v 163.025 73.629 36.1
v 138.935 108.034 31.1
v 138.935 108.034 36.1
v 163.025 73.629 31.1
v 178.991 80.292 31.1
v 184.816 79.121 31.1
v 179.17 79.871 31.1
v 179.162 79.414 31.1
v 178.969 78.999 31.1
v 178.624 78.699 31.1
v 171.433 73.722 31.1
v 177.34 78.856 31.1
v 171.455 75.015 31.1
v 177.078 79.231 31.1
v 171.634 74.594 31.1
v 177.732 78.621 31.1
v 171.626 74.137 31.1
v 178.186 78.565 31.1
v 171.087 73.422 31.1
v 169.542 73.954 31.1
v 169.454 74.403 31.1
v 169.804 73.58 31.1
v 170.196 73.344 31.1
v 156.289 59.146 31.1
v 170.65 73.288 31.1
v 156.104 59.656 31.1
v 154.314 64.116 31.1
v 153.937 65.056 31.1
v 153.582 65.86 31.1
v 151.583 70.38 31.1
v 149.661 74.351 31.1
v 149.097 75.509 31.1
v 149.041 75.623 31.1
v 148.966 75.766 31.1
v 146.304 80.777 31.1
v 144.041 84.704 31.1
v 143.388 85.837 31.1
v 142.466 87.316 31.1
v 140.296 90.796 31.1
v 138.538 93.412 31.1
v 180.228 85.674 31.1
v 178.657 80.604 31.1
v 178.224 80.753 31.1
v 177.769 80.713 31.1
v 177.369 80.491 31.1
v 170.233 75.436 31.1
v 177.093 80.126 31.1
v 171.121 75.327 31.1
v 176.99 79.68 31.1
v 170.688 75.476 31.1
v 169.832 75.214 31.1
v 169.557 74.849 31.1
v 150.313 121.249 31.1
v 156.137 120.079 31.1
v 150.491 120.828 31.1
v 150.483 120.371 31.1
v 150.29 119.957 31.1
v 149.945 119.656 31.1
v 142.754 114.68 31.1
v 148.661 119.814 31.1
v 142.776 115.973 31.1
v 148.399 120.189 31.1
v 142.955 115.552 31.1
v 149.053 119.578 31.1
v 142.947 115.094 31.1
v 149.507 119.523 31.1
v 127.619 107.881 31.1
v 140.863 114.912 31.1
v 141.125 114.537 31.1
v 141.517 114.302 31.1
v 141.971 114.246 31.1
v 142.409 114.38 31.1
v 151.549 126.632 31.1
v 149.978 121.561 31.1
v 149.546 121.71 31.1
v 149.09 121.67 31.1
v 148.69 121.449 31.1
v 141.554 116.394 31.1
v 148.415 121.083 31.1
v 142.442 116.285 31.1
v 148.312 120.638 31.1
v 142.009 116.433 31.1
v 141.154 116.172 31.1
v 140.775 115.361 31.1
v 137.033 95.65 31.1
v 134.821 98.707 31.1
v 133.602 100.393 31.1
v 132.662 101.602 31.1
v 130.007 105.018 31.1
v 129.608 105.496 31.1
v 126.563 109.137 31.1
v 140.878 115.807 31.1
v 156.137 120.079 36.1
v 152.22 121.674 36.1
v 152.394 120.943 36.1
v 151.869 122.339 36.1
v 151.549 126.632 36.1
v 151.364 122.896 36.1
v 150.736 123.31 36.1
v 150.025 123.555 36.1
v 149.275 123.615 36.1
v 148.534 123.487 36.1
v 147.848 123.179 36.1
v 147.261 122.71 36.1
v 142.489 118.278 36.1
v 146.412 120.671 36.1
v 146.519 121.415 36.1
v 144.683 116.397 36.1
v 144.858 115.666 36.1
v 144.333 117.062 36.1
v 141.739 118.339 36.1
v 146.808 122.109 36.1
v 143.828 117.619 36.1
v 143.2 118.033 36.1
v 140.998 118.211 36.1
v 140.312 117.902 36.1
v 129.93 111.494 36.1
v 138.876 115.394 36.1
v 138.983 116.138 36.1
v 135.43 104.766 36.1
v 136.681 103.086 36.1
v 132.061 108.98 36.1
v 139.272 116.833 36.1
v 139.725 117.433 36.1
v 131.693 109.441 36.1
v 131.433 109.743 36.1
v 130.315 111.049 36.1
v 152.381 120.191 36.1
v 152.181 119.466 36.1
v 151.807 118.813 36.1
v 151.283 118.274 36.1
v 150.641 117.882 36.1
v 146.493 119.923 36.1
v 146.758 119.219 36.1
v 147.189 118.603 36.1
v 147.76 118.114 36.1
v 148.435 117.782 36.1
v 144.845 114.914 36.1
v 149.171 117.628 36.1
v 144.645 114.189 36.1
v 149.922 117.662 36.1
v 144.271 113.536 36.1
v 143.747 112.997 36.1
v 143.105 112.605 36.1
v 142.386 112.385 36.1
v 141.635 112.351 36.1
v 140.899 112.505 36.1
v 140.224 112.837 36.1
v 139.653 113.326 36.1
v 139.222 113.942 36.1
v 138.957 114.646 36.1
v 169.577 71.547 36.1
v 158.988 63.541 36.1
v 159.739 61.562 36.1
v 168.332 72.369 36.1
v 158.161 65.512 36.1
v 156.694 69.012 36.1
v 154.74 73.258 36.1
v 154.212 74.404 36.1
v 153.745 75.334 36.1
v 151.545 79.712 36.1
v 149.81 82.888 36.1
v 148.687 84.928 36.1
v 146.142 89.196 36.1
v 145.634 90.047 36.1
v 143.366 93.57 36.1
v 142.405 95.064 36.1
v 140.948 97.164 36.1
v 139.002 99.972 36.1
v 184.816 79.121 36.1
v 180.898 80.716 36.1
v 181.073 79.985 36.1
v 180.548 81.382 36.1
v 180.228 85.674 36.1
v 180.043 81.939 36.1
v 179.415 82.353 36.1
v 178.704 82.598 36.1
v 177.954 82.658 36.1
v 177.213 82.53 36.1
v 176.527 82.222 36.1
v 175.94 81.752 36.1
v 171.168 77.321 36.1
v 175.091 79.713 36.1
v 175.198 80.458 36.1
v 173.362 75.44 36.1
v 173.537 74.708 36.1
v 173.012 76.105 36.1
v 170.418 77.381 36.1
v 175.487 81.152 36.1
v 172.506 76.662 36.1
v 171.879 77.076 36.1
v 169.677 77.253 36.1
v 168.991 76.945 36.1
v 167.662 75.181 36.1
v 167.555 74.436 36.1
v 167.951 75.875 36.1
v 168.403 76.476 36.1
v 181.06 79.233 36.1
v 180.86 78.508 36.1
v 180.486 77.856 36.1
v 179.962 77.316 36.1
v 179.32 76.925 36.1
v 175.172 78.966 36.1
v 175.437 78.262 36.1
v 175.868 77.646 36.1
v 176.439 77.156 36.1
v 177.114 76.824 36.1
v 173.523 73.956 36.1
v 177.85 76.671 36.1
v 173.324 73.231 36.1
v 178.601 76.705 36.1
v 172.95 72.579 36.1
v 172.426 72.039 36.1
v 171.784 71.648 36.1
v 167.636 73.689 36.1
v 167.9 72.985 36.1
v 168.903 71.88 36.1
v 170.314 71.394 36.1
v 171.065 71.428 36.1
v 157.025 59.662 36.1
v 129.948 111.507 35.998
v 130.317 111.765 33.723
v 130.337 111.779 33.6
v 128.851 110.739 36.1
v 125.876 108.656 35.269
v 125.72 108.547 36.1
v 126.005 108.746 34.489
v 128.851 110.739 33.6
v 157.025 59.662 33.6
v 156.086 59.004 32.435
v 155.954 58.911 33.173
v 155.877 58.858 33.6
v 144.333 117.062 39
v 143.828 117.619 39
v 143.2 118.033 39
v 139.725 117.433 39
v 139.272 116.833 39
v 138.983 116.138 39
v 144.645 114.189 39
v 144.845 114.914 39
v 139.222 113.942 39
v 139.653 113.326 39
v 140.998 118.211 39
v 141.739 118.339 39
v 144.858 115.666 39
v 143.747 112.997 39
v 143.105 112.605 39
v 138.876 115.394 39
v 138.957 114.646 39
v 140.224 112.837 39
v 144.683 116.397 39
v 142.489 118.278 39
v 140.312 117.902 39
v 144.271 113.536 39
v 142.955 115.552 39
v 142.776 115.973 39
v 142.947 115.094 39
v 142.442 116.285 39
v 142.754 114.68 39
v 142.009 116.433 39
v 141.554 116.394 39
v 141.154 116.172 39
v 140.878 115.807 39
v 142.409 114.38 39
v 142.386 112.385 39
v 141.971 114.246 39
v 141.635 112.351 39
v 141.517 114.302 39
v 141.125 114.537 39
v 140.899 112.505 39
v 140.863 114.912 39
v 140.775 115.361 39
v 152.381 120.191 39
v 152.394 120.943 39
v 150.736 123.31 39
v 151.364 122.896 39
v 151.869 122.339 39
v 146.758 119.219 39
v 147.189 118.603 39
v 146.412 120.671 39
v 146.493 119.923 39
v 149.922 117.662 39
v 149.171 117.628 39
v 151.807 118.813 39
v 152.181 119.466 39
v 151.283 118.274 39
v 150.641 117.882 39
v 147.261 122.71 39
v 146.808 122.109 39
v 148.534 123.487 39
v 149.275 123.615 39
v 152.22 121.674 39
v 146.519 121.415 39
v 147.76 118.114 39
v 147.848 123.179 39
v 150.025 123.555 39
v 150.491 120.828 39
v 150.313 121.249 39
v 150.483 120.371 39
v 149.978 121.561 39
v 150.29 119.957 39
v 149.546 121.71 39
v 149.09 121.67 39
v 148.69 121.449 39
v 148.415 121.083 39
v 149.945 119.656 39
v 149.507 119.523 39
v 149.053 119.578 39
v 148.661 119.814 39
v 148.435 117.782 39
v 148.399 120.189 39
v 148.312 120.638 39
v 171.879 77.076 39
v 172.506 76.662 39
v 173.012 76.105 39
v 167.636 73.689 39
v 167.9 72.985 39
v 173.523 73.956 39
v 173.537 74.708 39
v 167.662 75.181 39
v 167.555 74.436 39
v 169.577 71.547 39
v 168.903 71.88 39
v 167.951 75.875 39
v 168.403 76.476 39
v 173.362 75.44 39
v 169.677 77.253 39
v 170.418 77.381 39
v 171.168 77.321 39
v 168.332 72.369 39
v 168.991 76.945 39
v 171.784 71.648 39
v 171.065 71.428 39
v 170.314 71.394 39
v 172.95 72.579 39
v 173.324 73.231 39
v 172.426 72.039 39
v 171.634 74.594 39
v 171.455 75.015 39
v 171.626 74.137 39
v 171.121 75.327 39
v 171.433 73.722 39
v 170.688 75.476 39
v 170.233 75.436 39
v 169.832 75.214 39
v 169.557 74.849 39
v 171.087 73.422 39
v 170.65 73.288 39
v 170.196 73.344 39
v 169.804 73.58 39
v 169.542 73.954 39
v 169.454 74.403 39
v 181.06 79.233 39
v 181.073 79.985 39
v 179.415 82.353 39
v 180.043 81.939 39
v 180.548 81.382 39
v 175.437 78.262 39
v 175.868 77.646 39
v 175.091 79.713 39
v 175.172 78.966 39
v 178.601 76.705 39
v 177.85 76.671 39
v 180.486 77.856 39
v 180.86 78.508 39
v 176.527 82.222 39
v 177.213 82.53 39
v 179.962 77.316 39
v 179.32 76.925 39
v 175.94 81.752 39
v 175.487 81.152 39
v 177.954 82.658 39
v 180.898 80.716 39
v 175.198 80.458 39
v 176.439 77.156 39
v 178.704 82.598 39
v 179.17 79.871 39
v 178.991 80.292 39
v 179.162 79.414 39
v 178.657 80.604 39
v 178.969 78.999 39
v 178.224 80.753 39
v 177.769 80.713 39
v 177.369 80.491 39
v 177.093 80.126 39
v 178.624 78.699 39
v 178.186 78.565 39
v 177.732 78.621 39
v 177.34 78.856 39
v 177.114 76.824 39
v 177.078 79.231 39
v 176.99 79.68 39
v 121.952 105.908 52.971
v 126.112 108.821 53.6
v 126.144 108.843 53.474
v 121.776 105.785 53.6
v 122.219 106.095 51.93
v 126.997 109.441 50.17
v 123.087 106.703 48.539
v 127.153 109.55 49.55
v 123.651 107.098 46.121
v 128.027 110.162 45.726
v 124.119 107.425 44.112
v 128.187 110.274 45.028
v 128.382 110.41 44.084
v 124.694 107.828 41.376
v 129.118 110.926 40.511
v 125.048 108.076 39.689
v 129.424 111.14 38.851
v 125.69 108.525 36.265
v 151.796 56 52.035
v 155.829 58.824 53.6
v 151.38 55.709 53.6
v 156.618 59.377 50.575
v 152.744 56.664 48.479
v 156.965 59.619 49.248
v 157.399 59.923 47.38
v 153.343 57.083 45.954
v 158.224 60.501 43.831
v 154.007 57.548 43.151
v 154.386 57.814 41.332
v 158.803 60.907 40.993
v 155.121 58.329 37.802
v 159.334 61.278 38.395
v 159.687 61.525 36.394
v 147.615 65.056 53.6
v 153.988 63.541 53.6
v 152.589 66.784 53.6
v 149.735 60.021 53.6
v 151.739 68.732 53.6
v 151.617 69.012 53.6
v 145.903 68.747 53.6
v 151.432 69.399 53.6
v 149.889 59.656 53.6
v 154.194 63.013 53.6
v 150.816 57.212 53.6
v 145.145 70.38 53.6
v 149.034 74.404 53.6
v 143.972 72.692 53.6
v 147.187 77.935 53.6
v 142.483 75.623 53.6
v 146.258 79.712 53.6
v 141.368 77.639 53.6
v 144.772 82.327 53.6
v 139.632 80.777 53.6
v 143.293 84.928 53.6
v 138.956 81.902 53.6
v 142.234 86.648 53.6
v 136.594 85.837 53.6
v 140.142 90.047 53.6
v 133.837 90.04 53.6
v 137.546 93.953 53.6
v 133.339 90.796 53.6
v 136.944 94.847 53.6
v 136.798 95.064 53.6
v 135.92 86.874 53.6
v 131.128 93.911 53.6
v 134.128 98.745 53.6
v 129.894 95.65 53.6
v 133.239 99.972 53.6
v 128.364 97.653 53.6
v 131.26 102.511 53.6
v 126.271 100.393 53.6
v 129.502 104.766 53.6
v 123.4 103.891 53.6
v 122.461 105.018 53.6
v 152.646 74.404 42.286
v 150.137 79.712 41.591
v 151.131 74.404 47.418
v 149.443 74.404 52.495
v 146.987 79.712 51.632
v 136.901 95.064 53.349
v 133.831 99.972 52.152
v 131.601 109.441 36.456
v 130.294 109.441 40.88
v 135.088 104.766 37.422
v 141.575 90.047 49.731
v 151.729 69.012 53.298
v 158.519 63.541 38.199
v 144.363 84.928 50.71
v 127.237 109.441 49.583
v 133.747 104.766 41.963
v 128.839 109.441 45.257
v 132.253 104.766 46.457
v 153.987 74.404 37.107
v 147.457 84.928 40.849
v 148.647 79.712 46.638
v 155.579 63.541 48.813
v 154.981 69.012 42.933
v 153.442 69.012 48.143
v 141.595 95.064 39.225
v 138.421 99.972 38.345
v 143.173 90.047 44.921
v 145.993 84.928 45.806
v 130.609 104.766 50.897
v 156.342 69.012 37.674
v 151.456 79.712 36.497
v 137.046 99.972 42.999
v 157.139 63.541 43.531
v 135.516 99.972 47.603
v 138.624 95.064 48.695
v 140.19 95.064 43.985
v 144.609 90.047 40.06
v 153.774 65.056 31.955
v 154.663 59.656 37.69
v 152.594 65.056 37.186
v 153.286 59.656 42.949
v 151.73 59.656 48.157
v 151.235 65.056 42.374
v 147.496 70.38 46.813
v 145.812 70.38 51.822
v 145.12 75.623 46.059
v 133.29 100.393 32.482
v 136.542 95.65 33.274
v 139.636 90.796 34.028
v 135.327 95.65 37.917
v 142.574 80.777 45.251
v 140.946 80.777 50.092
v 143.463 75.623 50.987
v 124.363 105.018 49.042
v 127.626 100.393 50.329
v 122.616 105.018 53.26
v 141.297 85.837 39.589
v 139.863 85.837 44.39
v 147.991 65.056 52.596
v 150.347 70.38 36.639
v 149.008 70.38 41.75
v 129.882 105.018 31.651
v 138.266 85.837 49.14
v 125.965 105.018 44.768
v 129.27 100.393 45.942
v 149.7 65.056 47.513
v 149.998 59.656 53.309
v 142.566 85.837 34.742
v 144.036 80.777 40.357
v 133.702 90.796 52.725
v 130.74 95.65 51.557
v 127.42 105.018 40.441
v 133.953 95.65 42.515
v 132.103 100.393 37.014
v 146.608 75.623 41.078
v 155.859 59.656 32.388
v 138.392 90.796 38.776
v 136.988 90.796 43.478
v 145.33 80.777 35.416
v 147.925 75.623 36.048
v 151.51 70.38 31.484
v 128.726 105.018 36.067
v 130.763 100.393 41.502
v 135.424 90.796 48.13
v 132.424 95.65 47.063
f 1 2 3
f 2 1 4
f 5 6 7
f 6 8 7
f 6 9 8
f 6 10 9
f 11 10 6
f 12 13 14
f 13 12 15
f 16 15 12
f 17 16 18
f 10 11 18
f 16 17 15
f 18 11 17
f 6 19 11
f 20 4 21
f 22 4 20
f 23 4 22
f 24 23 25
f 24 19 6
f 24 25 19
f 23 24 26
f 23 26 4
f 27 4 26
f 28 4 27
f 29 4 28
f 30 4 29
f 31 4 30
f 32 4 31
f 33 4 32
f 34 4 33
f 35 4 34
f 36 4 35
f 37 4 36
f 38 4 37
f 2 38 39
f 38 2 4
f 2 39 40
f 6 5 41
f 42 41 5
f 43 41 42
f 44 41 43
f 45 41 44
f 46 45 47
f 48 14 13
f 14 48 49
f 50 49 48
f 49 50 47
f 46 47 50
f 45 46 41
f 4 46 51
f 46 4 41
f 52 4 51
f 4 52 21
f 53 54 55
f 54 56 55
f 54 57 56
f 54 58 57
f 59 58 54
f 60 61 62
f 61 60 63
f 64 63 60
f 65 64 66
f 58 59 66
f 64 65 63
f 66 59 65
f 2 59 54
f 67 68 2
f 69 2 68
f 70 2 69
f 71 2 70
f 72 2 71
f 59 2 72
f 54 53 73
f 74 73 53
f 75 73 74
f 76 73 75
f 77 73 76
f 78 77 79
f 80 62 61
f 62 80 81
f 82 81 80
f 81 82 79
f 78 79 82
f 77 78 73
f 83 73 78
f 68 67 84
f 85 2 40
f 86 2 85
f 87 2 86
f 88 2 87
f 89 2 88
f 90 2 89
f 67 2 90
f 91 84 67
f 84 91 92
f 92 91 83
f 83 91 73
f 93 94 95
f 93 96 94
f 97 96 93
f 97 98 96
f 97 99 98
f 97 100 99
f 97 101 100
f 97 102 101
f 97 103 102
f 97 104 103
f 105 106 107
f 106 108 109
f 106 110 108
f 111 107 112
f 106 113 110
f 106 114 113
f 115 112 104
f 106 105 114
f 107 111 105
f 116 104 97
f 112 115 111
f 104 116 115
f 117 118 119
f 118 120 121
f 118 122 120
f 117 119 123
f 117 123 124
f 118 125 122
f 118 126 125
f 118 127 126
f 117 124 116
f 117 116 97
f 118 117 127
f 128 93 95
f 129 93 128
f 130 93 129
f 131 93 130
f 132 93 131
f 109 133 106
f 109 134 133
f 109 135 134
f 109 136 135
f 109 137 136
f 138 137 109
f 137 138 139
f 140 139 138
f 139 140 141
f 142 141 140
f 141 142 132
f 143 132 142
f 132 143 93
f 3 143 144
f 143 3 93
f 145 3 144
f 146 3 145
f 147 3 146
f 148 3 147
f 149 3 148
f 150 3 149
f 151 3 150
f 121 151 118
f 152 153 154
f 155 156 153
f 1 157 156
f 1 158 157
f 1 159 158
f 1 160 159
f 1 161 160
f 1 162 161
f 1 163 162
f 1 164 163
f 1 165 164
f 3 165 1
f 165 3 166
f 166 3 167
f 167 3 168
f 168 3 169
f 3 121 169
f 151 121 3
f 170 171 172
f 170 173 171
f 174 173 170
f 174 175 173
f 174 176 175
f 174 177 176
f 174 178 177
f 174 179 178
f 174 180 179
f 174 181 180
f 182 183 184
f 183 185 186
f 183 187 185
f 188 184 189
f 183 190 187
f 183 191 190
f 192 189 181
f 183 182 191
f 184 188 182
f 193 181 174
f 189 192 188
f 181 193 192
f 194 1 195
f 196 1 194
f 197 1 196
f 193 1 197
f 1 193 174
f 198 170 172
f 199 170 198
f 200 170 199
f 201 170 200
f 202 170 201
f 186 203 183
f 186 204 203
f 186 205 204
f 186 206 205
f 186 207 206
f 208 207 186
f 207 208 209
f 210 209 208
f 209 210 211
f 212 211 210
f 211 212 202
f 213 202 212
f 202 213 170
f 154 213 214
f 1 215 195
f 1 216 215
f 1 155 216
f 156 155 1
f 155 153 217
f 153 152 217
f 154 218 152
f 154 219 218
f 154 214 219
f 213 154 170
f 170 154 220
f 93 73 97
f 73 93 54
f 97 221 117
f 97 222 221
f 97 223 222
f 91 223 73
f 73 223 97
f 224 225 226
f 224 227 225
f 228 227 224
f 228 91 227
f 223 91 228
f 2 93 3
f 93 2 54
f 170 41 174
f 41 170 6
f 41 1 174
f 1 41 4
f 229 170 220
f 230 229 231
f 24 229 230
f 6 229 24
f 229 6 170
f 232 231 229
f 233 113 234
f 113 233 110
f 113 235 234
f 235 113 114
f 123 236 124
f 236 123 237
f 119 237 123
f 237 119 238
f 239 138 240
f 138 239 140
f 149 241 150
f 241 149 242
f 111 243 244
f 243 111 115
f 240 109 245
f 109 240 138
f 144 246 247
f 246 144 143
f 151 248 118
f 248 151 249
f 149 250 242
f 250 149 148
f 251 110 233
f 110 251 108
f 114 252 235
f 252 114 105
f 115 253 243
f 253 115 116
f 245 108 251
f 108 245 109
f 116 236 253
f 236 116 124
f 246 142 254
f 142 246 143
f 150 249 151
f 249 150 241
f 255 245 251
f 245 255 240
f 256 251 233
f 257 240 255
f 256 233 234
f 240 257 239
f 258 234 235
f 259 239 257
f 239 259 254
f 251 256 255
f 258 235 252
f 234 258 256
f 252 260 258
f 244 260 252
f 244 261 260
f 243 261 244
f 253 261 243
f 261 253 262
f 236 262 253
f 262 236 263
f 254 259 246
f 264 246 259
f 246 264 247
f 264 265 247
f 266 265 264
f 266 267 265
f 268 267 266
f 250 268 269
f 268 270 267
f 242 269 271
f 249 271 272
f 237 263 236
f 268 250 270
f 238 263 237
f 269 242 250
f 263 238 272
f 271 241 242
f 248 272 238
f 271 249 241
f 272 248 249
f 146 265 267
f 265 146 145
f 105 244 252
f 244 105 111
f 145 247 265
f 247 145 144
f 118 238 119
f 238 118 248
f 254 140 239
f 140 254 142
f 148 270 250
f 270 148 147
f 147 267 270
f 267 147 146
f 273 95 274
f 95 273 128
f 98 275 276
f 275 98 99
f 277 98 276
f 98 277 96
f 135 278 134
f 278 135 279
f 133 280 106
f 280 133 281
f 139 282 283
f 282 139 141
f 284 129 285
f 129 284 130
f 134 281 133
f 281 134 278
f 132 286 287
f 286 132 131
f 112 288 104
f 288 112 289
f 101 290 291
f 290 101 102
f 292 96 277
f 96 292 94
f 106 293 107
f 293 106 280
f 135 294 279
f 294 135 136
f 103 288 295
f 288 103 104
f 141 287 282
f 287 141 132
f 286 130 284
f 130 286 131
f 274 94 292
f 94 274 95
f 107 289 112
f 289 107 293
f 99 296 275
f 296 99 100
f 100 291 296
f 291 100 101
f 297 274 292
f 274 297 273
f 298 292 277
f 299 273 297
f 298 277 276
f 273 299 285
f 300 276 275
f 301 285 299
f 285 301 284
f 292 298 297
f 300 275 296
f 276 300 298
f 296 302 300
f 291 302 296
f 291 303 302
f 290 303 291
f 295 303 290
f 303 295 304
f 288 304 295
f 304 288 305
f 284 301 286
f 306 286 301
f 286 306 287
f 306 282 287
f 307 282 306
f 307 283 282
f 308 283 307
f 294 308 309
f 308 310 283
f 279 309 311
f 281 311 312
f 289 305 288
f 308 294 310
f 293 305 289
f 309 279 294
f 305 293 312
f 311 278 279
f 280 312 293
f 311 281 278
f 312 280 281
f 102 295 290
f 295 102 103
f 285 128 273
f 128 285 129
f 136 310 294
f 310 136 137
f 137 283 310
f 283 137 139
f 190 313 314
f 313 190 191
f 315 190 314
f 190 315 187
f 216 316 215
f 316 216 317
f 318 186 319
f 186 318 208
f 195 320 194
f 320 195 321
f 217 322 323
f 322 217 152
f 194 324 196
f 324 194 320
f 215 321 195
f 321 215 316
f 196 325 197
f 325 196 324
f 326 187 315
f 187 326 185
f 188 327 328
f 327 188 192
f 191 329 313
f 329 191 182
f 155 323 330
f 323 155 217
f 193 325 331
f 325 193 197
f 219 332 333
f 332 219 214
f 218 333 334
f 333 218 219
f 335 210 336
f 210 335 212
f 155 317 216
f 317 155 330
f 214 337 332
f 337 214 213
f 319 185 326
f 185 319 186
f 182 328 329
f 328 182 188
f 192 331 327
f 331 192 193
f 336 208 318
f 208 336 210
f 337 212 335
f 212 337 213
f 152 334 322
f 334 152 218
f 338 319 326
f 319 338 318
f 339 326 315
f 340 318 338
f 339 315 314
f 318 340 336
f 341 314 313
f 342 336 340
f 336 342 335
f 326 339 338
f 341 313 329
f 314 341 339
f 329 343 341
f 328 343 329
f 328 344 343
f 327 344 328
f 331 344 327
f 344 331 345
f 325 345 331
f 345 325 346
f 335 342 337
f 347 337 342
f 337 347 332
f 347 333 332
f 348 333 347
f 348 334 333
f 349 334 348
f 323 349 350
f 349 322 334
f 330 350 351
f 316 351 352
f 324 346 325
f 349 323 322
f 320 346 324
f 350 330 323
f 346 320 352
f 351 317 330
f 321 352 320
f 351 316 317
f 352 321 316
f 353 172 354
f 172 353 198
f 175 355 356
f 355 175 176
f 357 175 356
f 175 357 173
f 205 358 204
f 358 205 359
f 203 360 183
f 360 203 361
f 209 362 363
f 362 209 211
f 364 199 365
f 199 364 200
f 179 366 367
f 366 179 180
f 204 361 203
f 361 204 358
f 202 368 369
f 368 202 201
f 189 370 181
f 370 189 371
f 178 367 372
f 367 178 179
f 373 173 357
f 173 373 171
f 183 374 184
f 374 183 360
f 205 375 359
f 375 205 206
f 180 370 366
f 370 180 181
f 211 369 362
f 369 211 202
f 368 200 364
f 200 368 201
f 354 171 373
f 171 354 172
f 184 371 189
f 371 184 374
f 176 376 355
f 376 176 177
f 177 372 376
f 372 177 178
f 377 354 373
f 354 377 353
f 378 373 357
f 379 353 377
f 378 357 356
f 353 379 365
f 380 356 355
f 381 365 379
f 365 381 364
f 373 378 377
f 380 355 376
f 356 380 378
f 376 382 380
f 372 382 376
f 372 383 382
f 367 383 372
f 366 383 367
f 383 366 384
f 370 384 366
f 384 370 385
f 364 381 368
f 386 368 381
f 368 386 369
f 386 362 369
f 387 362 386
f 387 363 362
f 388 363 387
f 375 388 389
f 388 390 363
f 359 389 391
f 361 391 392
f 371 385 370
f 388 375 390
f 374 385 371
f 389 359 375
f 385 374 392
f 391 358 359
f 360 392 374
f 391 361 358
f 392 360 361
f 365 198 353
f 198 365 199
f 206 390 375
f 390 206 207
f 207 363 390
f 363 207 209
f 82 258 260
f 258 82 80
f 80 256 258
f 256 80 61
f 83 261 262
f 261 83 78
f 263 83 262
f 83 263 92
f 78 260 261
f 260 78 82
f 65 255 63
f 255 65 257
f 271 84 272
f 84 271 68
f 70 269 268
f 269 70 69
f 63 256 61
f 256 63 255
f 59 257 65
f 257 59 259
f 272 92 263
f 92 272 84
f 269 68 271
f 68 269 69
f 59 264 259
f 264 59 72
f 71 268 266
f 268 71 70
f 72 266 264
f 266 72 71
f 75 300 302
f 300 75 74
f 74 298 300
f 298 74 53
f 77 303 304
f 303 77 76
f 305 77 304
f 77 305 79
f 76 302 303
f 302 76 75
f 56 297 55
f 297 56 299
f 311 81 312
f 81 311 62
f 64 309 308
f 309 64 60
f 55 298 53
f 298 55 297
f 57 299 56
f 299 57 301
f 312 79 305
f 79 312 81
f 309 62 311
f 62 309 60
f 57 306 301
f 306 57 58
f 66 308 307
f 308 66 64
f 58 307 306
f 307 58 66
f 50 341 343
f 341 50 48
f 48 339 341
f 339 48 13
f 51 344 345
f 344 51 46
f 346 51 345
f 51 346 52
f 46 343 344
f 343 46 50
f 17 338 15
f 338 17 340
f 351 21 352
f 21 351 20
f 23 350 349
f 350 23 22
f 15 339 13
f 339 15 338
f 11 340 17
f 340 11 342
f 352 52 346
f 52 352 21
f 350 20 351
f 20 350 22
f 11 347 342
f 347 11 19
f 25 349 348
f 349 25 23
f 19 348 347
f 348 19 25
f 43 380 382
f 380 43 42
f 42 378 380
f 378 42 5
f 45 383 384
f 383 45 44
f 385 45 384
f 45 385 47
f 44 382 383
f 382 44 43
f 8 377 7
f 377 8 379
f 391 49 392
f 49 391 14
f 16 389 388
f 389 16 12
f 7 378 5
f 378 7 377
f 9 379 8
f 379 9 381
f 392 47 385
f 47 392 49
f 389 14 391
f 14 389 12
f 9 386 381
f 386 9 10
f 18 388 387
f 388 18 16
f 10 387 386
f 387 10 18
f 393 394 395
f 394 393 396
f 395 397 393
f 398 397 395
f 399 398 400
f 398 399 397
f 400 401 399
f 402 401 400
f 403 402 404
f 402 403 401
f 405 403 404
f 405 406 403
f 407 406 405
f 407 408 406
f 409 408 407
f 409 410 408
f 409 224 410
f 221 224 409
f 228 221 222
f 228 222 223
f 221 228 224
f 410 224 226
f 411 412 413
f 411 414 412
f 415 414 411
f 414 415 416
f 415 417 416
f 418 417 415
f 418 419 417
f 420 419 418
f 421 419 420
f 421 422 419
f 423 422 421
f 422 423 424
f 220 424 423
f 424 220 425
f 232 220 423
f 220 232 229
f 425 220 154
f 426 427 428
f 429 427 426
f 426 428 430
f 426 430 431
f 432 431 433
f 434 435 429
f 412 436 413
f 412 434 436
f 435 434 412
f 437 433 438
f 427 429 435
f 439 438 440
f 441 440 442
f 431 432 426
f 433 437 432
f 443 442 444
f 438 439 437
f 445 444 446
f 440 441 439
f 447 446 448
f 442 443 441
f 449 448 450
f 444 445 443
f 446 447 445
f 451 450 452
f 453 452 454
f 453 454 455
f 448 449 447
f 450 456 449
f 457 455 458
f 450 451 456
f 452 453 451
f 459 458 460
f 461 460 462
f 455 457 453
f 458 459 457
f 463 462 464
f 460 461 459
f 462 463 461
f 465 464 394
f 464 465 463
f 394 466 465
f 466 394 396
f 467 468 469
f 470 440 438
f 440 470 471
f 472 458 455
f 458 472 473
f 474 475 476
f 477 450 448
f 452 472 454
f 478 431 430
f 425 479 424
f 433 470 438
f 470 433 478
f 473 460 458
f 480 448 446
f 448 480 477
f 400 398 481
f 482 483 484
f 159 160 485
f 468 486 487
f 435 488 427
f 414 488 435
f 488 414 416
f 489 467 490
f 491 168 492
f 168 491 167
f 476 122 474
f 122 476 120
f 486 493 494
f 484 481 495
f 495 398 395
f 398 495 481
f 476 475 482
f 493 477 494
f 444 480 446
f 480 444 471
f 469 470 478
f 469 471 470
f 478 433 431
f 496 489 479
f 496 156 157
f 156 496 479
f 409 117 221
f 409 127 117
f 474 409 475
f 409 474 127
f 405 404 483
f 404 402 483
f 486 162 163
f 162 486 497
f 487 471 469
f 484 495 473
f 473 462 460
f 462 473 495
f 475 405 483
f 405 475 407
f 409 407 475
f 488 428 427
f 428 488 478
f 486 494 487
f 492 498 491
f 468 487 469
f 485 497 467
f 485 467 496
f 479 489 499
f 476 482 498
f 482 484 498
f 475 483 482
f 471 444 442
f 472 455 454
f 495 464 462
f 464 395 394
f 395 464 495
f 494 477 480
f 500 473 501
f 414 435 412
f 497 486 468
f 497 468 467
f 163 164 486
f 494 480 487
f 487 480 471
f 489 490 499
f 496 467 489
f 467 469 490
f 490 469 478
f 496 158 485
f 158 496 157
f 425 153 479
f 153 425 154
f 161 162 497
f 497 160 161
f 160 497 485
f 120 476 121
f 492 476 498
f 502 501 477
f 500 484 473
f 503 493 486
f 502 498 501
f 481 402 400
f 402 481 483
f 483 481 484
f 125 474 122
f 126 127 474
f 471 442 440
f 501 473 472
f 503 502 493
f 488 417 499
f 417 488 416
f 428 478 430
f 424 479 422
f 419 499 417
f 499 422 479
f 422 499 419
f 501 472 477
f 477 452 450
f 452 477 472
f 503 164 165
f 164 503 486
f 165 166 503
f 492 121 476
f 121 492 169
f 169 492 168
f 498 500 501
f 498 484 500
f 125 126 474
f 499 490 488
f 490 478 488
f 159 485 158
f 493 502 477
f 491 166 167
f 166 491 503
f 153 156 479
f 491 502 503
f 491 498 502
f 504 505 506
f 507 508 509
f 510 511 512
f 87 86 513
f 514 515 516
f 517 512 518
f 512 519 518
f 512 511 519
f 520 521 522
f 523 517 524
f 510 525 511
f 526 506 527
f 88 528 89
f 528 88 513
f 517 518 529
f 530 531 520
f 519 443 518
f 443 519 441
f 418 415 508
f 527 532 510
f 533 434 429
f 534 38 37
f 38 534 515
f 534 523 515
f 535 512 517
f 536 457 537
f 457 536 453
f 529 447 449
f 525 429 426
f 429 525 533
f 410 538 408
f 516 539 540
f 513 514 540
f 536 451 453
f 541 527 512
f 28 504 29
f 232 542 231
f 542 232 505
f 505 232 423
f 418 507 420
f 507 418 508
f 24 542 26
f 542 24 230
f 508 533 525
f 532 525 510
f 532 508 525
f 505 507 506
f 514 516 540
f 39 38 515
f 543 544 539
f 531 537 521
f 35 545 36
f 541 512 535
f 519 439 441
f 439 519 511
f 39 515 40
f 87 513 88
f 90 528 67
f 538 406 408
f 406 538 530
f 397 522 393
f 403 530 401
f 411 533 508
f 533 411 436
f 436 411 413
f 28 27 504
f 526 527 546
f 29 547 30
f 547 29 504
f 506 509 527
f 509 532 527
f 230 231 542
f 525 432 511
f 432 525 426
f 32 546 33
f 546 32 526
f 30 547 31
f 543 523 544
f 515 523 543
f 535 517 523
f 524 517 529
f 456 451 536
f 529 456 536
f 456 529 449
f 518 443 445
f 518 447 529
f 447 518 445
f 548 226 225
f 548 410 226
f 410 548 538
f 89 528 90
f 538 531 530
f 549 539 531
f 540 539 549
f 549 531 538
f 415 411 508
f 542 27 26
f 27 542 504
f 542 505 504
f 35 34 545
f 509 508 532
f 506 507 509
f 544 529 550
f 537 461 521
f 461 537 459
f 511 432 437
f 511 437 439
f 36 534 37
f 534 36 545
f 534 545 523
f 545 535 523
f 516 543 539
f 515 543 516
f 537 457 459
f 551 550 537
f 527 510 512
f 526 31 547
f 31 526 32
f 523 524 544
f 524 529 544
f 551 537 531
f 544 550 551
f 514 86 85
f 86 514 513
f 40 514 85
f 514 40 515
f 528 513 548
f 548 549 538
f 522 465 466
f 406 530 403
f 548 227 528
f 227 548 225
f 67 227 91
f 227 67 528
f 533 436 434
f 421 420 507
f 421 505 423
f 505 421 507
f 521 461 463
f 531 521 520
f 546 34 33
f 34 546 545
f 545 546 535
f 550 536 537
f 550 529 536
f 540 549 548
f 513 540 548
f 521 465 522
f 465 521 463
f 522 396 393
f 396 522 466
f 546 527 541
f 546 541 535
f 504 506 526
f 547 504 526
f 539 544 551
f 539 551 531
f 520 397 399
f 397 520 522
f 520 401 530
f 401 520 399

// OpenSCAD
// file: ../motors/MN5212.scad
use <../utils.scad>

module MN5212(){

	//render(){
		difference(){
			union(){
				translate([0,0, 42.5 / 2 - 23 / 2 - 4.9 - 6])
					cylinder(
						h = 23,
						r = 59 / 2,
						$fa = fa(59 / 2),
						center = true);
				translate([0,0, 42.5 / 2 - 4.9 / 2 - 6])
					cylinder(
						h = 4.9,
						r1 = 59 / 2,
						r2 = 24.8 / 2,
						$fa = fa(59 / 2),
						center = true);
				translate([0,0, - 42.5 / 2 + 5.6 / 2 + 3])
					cylinder(
						h = 5.6,
						r1 = 44 / 2,
						r2 = 59 / 2,
						$fa = fa(59 / 2),
						center = true);
				translate([0, 0, 42.5 / 2 - 3])
					cylinder(
						h = 6,
						r = 4 / 2,
						$fa = fa(4 / 2),
						center = true);
				translate([0, 0, - 42.5 / 2 + 1.5])
					cylinder(
						h = 3,
						r = 6 / 2,
						$fa = fa(6 / 2),
						center = true);
			}
			union(){
				for(i = [0:90:270])
					rotate([0, 0, i])
						translate([0, 25 / 2, -16.25 - 0.025])
							cylinder(
								h = 4,
								r = 3 / 2,
								$fa = fa(3 / 2),
								center = true);
				for(i = [0:120:240])
					rotate([0, 0, i])
						translate([0, 17 / 2, 12.75 + 0.025])
							cylinder(
								h = 5,
								r = 3 / 2,
								$fa = fa(3 / 2),
								center = true);
				rotate([0, 0, 30])
					translate([0, 12 / 2, 12.75 + 0.025])
						cylinder(
							h = 5,
							r = 3 / 2,
							$fa = fa(3 / 2),
							center = true);
				rotate([0, 0, 30 + 180])
					translate([0, 12 / 2, 12.75 + 0.025])
						cylinder(
							h = 5,
							r = 3 / 2,
							$fa = fa(3 / 2),
							center = true);
			}
		}

	//}

}

MN5212();
// file: ../servos/TGY_4805_2PA.scad
use <../utils.scad>

module TGY_4805_2PA(){

	length = 40;
	width = 20;
	depth = 36.4;
	wing_width = 58;
	wing_thick = 2.45;
	wing_height = 27.7;
	shaft_offset = 9.5;
	hole_seperation = 9.2;
	hole_spacing = 50;
	shaft_height = 40;
	shaft_length = 3.6;
	hole_diameter = 4.8;

	module mounting_hole(){
		mh_rad = hole_diameter / 2;
		translate(
			[
				hole_spacing / 2,
				0,
				-depth / 2 + wing_height - wing_thick / 2
			])
			cylinder(h = 5, r = mh_rad, $fa = fa(mh_rad), center = true);
	}

	difference(){
		union(){
			cube([length, width, depth], center = true);
			translate([0, 0, -depth / 2 + wing_height - wing_thick / 2])
				cube([wing_width, width, wing_thick], center = true);
			translate(
				[
					- length / 2 + shaft_offset,
					0,
					shaft_height - length / 2 + shaft_length / 2
				])
				cylinder(
					h = shaft_length,
					r = 1.5,
					$fa = fa(1.5),
					center = true);
		}	union(){

			translate([0, hole_seperation / 2, 0]){
				mounting_hole();
				mirror() mounting_hole();
			}
			translate([0, -hole_seperation / 2, 0]){
				mounting_hole();
				mirror() mounting_hole();
			}
		}
	}
}

module TGY_4805_2PA_translate(){
	length = 40;
	shaft_offset = 9.5;
	shaft_height = 40;
	shaft_length = 3.6;
	translate(
		[
				- length / 2 + shaft_offset,
				0,
				shaft_height - length / 2 + shaft_length / 2
		]) children();
}

TGY_4805_2PA();
// file: ../servos/HS_5065MG.scad
use <../utils.scad>

module HS_5065MG(){

	length = 23.75;
	width = 11.68;
	depth = 20.32;
	wing_width = 32.38;
	wing_thick = 2;
	wing_offset = 1;
	shaft_offset = 6;
	hole_spacing = 28.32;
	hole_spacing_2 = 27;
	hole_2_wide = 6;
	hole_diameter = 2;
	shaft_height = 26.16;
	shaft_length = 2;

	module mounting_hole(){
		mh_rad = hole_diameter / 2;
		translate(
			[
				hole_spacing / 2,
				0,
				depth / 2 - wing_thick / 2
			])
			cylinder(h = 5, r = mh_rad, $fa = fa(mh_rad), center = true);
		translate(
			[
				hole_spacing_2 / 2,
				hole_2_wide / 2,
				depth / 2 - wing_thick / 2
			])
			cylinder(h = 5, r = mh_rad, $fa = fa(mh_rad), center = true);
		translate(
			[
				hole_spacing_2 / 2,
				- hole_2_wide / 2,
				depth / 2 - wing_thick / 2
			])
			cylinder(h = 5, r = mh_rad, $fa = fa(mh_rad), center = true);
	}

	difference(){
		union(){
			cube([length, width, depth], center = true);
			translate([0, 0, depth / 2 - wing_thick / 2 - wing_offset])
				cube([wing_width, width, wing_thick], center = true);
			translate(
				[
					- length / 2 + shaft_offset,
					0,
					depth / 2 + 3.8 + 1.9 + shaft_length / 2
				])
				cylinder(
					h = shaft_length,
					r = 1.5,
					$fa = fa(1.5),
					center = true);
			translate(
				[
					- length / 2 + shaft_offset,
					0,
					depth / 2 + 3.8 / 2
				])
				cylinder(
					h = 3.8,
					r = 11.3 / 2,
					$fa = fa(11.3 / 2),
					center = true);
			translate(
				[
					- length / 2 + shaft_offset,
					0,
					depth / 2 + 3.8 + 1.9 / 2
				])
				cylinder(
					h = 1.9,
					r1 = 11.3 / 2,
					r2 = 8 / 2,
					$fa = fa(11.3 / 2),
					center = true);
		}	union(){

			mounting_hole();
			mirror() mounting_hole();
		}
	}
}

module HS_5065MG_arm(){

	hole_size = 1.5;
	hole_spacing = 3;
	hole_offset = 9.6;

	difference(){
		union(){
			translate([0, 0, 4.4 / 2])
				cylinder(
					h = 4.4,
					r = 8 / 2,
					$fa = fa(8 / 2),
					center = true);
			hull(){
				translate([0, 0, 4.4 - 1.8 / 2])
					cylinder(
						h = 1.8,
						r = 8 / 2,
						$fa = fa(8 / 2),
						center = true);
				translate([18.8, 0, 4.4 - 1.8 / 2])
					cylinder(
						h = 1.8,
						r = 5 / 2,
						$fa = fa(5 / 2),
						center = true);
			}
		}
		union(){
			for(i = [0:3]){
				translate([hole_offset + hole_spacing * i, 0, 4.4 - 1.8 / 2])
					cylinder(
						h = 5,
						r = hole_size / 2,
						$fa = fa(hole_size / 2),
						center = true);
			}
		}
	}
}

module HS_5065MG_shaft_translate(){
	translate(
		[
			- 23.75 / 2 + 6,
			0,
			20.32 / 2 + 3.8 + 1.9
		])
			children();
}

HS_5065MG();
HS_5065MG_shaft_translate() HS_5065MG_arm();
// file: ../servos/LS_0006_servo.scad
// Author Michael Marques (DrYerzinia)

use <../utils.scad>

module ls_0006_servo(){
	
	length = 21.4;
	depth = 19.9;
	thickness = 11.65;

	gear_height = 2.6;
	gear_bump_height = 0.7;
	gear_bump_diameter = 1.97;
	gear_outer_bump_diameter = 6;
	gear_bump_offset = 12.2;

	shaft_height = 2.4;
	shaft_diameter = 3.74;
	shaft_offset = thickness / 2;
	shaft_screw_diameter = 1.3;
	
	wing_outer_width = 8.5;
	wing_top_off = 3.8;
	wing_length = 3.8;
	wing_thickness = 1.2;
	wing_hole_diameter = 1.85;
	wing_hole_edge_dist = 2;

	module wing_hole(){
		translate(
			[
				length / 2 + wing_hole_edge_dist,
				0,
				depth/2 - wing_top_off - wing_thickness / 2
			])
			cylinder(
				h = wing_thickness + 1,
				r = wing_hole_diameter / 2,
				$fn = 16,
				center = true);
	}

	module wing(){
		translate(
			[
				length / 2,
				thickness / 2,
				depth/2 - wing_top_off - wing_thickness
			])
			rotate([0,0,-90])
				trapezoid(
					thickness,
					wing_outer_width,
					wing_length,
					wing_thickness);
	}

	// Body
	cube([length, thickness, depth], center = true);

	difference(){
		union(){

			wing();
			mirror() wing();

			// Gear Bumps
			translate([0, 0, depth/2 + gear_height / 2]){
				translate([length / 2 - gear_bump_offset, 0, 0])
					cylinder(
						h = gear_height,
						r = gear_outer_bump_diameter / 2,
						$fn = 16,
						center = true);
				translate([length / 2 - gear_bump_offset, 0, gear_height/2 + gear_bump_height / 2])
					cylinder(
						h = gear_bump_height,
						r = gear_bump_diameter / 2,
						$fn = 16,
						center = true);
				translate([length / 2 - shaft_offset, 0, 0])
					cylinder(
						h = gear_height,
						r = thickness / 2,
						$fn = 32,
						center = true);
				// Shaft
				translate([length / 2 - shaft_offset, 0, gear_height])
					cylinder(
						h = shaft_height,
						r = shaft_diameter / 2,
						$fn = 16,
						center = true);
			}

		}
		union(){

			wing_hole();
			mirror() wing_hole();

			// Shaft_hole
			translate(
				[
					length / 2 - shaft_offset,
					0,
					depth/2 + gear_height * (3 / 2) + 0.5])
				cylinder(
					h = shaft_height + 1,
					r = shaft_screw_diameter / 2,
					$fn = 16,
					center = true);

		}
	}

}

module translate_ls_0006_attachment(){

	length = 21.4;
	thickness = 11.65;
	shaft_offset = thickness / 2;
	depth = 19.9;
	float = 3.3;

	translate([length / 2 - shaft_offset, 0, depth / 2 + float])
		children();

}

module bar_attachment(){

	height = 3.75;
	bar_length = 14.7;
	bar_thickness = 1.6;
	inner_radius = 5.9;
	outer_radius = 3.95;
	shaft_diameter = 3.7;
	upper_void_diameter = 4.8;
	screw_diameter = 2;
	hole_spacing = 2;
	hole_4_diameter = 1.2;
	hole_diameter = 1;
	hole_start_off = 4.7;
	top_void_depth = 0.67;
	bottom_void_depth = 1.84;

	translate([0, 0, height / 2]){
		difference(){
			union(){

				translate([0, inner_radius / 2, height / 2 - bar_thickness])
					rotate([0,0,-90])
						trapezoid(
							inner_radius,
							outer_radius,
							bar_length,
							bar_thickness);

				cylinder(
					h = height,
					r = inner_radius / 2,
					$fn = 16,
					center = true);

				translate([bar_length, 0, height / 2 - bar_thickness / 2])
					cylinder(
						h = bar_thickness,
						r = outer_radius / 2,
						$fn = 16,
						center = true);

			}
			union(){
				// screwhole
				cylinder(
					h = height + 1,
					r = screw_diameter / 2,
					$fn = 16,
					center = true);
				// voids
				translate([0, 0, height / 2 - top_void_depth / 2 + 0.5])
					cylinder(
						h = top_void_depth + 1,
						r = upper_void_diameter / 2,
						$fn = 16,
						center = true);
				translate([0, 0,  - bottom_void_depth / 2 - 0.5])
					cylinder(
						h = bottom_void_depth + 1,
						r = shaft_diameter / 2,
						$fn = 16,
						center = true);

				for(i = [0:4]){
					dia = (i != 3) ? hole_diameter : hole_4_diameter;
					translate(
						[
							hole_start_off + hole_spacing * i,
							0,
							height / 2 - bar_thickness / 2])
						cylinder(
							h = bar_thickness + 1,
							r = dia / 2,
							$fn = 16,
							center = true);
				}

			}
		}
	}

}

ls_0006_servo();
translate_ls_0006_attachment() bar_attachment();
// file: ../servos/parallax_continuous_rotation_servo.scad
// Author Michael Marques (DrYerzinia)

module parallax_continuous_rotation_servo(){

	depth = 37.7;
	length = 40.75;
	width = 19.75;

	mount_height = 2.7;
	mount_extent = 6.1;
	mount_from_top = 7.7;

	mount_hole_diameter = 4.46;
	mount_hole_spacing = 14.4 - mount_hole_diameter;

	shaft_diameter = 5.8;
	shaft_offset = 10;
	shaft_length = 3.5;

	module mounting_hole(){

			translate(
				[
					length / 2 + 5,
					mount_hole_spacing / 2,
					depth / 2 - mount_height / 2 - mount_from_top
				]
				)
				cylinder(
					h = mount_height + 1,
					r = mount_hole_diameter / 2,
					$fn=16,
					center = true);
	}

	difference(){
		union(){

			// Body
			cube([length,width,depth], center = true);

			// Mounting wings
			translate(
				[
					0,
					0,
					depth / 2 - mount_height / 2 - mount_from_top
				])
				cube(
					[
						length + mount_extent * 2,
						width,
						mount_height
					],
					center = true);

			// Shaft
			translate(
				[
					length / 2 - shaft_offset,
					0,
					depth / 2 + shaft_length / 2
				]
				)
				cylinder(
					h = shaft_length,
					r = shaft_diameter / 2,
					$fn = 16,
					center = true
				);

		}
		union(){

			// Mounting Holes
			mounting_hole();
			mirror()
				mounting_hole();

			translate([0,-mount_hole_spacing,0]){
				mounting_hole();
				mirror()
					mounting_hole();
			}
		}
	}

}

module translate_shaft(){

	depth = 37.7;
	length = 40.75;

	shaft_offset = 10;

	translate(
		[
			length / 2 - shaft_offset,
			0,
			depth / 2
		])
		children();
}

module round_servo_attachment(){

	height = 6;
	diameter = 20.8;
	inner_diameter = 8.6;
	plate_thickness = 2.45;

	float = 2;

	depth = 37.7;
	length = 40.75;

	shaft_offset = 10;

	plate_hole_spacing = 14.5;
	plate_hole_diameter = 1.4;
	plate_hole_minor_spacing = 3.5;

	screw_hole_diameter = 3;

	inner_diameter = 8;
	
	top_depth = 1.8;
	bottom_depth = 3.4;

	void_diameter = 5.8;

	module plate_hole(){
		cylinder(
			h = plate_thickness + 1,
			r = plate_hole_diameter / 2,
			$fn = 16,
			center = true
		);
	}

	module plate_hole_group(){
		translate([0, 0, height / 2 - plate_thickness / 2]){
			translate([0, plate_hole_spacing / 2, 0]){
					plate_hole();
					translate([- plate_hole_minor_spacing, 0, 0])
						plate_hole();
					translate([  plate_hole_minor_spacing, 0, 0])
						plate_hole();
			}
		}
	}

	translate(
		[
			length / 2 - shaft_offset,
			0,
			depth / 2 + height / 2 + float
		]
		)
		difference(){

			union(){

				// inner shaft
				cylinder(
					h = height,
					r = inner_diameter / 2,
					$fn = 16,
					center = true
				);

				// top
				translate([0, 0, height / 2 - plate_thickness / 2])
					cylinder(
						h = plate_thickness,
						r = diameter / 2,
						$fn = 32,
						center = true
					);
			}

			union(){

				// plate holes
				for(ang = [0:3]){
					rotate([0,0, ang * 90])
						plate_hole_group();
				}

				// screw hole
				cylinder(
					h = height + 1,
					r = screw_hole_diameter / 2,
					$fn = 16,
					center = true
				);

				// inner voids
				translate([0, 0, height / 2 - top_depth / 2 + 1])
					cylinder(
						h = top_depth + 1,
						r = void_diameter / 2,
						$fn = 16,
						center = true
					);
				translate([0, 0, -1])
					cylinder(
						h = bottom_depth + 1,
						r = void_diameter / 2,
						$fn = 16,
						center = true
					);

			}

		}

}

parallax_continuous_rotation_servo();
round_servo_attachment();
// file: ../hardware.scad
 // Author Michael Marques (DrYerzinia)

// http://www.ebay.com/itm/10-PCS-683-3x7x2-mm-Metal-OPEN-PRECISION-Miniature-Ball-Bearing-3-7-2-/291206307942?hash=item43cd3fa066:m:mCi6eovrGVk_CjIUjlhw8yg
// E-Bay empire.rc

module washer_M3_7x3_2x0_5mm(){

	difference(){
		cylinder(
			h = 0.5,
			r = 7 / 2,
			$fn = 16,
			center = true);
		cylinder(
			h = 0.5 + 0.1,
			r = 3.2 / 2,
			$fn = 16,
			center = true);
	}

}

module bearing_3x7x2mm(){

	difference(){
		cylinder(
			h = 2,
			r = 7 / 2,
			$fn = 16,
			center = true);
		cylinder(
			h = 2 + 1,
			r = 3 / 2,
			$fn = 16,
			center = true);
	}

}

module bearing_5x8x2_5mm(){

	difference(){
		cylinder(
			h = 2.5,
			r = 8 / 2,
			$fn = 16,
			center = true);
		cylinder(
			h = 2.5 + 1,
			r = 5 / 2,
			$fn = 16,
			center = true);
	}

}

module bearing_8x16x5mm(){

	difference(){
		cylinder(
			h = 5,
			r = 16 / 2,
			$fn = 16,
			center = true);
		cylinder(
			h = 5 + 1,
			r = 8 / 2,
			$fn = 16,
			center = true);
	}

}


bearing_5x8x2_5mm();
// file: ../utils.scad
// http://forum.openscad.org/Creating-pie-pizza-slice-shape-need-a-dynamic-length-array-td3148.html

module pie_slice(r, start_angle, end_angle) {
    R = r * sqrt(2) + 1;
    a0 = (4 * start_angle + 0 * end_angle) / 4;
    a1 = (3 * start_angle + 1 * end_angle) / 4;
    a2 = (2 * start_angle + 2 * end_angle) / 4;
    a3 = (1 * start_angle + 3 * end_angle) / 4;
    a4 = (0 * start_angle + 4 * end_angle) / 4;
    if(end_angle > start_angle)
        intersection() {
        circle(r, $fa = fa(r));
        polygon([
            [0,0],
            [R * cos(a0), R * sin(a0)],
            [R * cos(a1), R * sin(a1)],
            [R * cos(a2), R * sin(a2)],
            [R * cos(a3), R * sin(a3)],
            [R * cos(a4), R * sin(a4)],
            [0,0]
       ]);
    }
}

// https://github.com/openscad/openscad/issues/29

module rotate_about(v,a) {
	translate(v) rotate(a) translate(-v) children();
}

module rotate_about_axis(v, ang, axis) {
	translate(v) rotate(ang, axis) translate(-v) children();
}

// https://github.com/robofun/openscad-utils/blob/master/trapezoid.scad

module trapezoid(width_base, width_top, height, thickness){
	

  linear_extrude(height = thickness)
		polygon(
			points =
				[
					[0,0],
					[width_base,0],
					[width_base-(width_base-width_top)/2,height],
					[(width_base-width_top)/2,height]
				],
				paths=[[0,1,2,3]]); 
  
}

// http://forum.openscad.org/fe-Tolerance-based-arc-approximation-td14212.html

function fa(r)=($fn>0)?360/$fn:($fe>0)?($fe<r)?min(45,2*acos(1-$fe/r)):45:$fa; 
// file: ../render_settings.scad
// Author Michael Marques (DrYerzinia)

// Lulzbot Mini tolerances
// x/y 0.1mm
// z   0.05mm
//
// 0.1mm   preview tolerance
// 0.025mm export  tolerance

$fs = 0.01;
$fn = undef;
$fa = 360 / 5;

$fe = 0.025;	// export
// main file
// Author Michael Marques (DrYerzinia)

include <../render_settings.scad>

use <../BB8.scad>

rotate([-90,0,0])
	Body_P14_motor_lift_servo_mount();
